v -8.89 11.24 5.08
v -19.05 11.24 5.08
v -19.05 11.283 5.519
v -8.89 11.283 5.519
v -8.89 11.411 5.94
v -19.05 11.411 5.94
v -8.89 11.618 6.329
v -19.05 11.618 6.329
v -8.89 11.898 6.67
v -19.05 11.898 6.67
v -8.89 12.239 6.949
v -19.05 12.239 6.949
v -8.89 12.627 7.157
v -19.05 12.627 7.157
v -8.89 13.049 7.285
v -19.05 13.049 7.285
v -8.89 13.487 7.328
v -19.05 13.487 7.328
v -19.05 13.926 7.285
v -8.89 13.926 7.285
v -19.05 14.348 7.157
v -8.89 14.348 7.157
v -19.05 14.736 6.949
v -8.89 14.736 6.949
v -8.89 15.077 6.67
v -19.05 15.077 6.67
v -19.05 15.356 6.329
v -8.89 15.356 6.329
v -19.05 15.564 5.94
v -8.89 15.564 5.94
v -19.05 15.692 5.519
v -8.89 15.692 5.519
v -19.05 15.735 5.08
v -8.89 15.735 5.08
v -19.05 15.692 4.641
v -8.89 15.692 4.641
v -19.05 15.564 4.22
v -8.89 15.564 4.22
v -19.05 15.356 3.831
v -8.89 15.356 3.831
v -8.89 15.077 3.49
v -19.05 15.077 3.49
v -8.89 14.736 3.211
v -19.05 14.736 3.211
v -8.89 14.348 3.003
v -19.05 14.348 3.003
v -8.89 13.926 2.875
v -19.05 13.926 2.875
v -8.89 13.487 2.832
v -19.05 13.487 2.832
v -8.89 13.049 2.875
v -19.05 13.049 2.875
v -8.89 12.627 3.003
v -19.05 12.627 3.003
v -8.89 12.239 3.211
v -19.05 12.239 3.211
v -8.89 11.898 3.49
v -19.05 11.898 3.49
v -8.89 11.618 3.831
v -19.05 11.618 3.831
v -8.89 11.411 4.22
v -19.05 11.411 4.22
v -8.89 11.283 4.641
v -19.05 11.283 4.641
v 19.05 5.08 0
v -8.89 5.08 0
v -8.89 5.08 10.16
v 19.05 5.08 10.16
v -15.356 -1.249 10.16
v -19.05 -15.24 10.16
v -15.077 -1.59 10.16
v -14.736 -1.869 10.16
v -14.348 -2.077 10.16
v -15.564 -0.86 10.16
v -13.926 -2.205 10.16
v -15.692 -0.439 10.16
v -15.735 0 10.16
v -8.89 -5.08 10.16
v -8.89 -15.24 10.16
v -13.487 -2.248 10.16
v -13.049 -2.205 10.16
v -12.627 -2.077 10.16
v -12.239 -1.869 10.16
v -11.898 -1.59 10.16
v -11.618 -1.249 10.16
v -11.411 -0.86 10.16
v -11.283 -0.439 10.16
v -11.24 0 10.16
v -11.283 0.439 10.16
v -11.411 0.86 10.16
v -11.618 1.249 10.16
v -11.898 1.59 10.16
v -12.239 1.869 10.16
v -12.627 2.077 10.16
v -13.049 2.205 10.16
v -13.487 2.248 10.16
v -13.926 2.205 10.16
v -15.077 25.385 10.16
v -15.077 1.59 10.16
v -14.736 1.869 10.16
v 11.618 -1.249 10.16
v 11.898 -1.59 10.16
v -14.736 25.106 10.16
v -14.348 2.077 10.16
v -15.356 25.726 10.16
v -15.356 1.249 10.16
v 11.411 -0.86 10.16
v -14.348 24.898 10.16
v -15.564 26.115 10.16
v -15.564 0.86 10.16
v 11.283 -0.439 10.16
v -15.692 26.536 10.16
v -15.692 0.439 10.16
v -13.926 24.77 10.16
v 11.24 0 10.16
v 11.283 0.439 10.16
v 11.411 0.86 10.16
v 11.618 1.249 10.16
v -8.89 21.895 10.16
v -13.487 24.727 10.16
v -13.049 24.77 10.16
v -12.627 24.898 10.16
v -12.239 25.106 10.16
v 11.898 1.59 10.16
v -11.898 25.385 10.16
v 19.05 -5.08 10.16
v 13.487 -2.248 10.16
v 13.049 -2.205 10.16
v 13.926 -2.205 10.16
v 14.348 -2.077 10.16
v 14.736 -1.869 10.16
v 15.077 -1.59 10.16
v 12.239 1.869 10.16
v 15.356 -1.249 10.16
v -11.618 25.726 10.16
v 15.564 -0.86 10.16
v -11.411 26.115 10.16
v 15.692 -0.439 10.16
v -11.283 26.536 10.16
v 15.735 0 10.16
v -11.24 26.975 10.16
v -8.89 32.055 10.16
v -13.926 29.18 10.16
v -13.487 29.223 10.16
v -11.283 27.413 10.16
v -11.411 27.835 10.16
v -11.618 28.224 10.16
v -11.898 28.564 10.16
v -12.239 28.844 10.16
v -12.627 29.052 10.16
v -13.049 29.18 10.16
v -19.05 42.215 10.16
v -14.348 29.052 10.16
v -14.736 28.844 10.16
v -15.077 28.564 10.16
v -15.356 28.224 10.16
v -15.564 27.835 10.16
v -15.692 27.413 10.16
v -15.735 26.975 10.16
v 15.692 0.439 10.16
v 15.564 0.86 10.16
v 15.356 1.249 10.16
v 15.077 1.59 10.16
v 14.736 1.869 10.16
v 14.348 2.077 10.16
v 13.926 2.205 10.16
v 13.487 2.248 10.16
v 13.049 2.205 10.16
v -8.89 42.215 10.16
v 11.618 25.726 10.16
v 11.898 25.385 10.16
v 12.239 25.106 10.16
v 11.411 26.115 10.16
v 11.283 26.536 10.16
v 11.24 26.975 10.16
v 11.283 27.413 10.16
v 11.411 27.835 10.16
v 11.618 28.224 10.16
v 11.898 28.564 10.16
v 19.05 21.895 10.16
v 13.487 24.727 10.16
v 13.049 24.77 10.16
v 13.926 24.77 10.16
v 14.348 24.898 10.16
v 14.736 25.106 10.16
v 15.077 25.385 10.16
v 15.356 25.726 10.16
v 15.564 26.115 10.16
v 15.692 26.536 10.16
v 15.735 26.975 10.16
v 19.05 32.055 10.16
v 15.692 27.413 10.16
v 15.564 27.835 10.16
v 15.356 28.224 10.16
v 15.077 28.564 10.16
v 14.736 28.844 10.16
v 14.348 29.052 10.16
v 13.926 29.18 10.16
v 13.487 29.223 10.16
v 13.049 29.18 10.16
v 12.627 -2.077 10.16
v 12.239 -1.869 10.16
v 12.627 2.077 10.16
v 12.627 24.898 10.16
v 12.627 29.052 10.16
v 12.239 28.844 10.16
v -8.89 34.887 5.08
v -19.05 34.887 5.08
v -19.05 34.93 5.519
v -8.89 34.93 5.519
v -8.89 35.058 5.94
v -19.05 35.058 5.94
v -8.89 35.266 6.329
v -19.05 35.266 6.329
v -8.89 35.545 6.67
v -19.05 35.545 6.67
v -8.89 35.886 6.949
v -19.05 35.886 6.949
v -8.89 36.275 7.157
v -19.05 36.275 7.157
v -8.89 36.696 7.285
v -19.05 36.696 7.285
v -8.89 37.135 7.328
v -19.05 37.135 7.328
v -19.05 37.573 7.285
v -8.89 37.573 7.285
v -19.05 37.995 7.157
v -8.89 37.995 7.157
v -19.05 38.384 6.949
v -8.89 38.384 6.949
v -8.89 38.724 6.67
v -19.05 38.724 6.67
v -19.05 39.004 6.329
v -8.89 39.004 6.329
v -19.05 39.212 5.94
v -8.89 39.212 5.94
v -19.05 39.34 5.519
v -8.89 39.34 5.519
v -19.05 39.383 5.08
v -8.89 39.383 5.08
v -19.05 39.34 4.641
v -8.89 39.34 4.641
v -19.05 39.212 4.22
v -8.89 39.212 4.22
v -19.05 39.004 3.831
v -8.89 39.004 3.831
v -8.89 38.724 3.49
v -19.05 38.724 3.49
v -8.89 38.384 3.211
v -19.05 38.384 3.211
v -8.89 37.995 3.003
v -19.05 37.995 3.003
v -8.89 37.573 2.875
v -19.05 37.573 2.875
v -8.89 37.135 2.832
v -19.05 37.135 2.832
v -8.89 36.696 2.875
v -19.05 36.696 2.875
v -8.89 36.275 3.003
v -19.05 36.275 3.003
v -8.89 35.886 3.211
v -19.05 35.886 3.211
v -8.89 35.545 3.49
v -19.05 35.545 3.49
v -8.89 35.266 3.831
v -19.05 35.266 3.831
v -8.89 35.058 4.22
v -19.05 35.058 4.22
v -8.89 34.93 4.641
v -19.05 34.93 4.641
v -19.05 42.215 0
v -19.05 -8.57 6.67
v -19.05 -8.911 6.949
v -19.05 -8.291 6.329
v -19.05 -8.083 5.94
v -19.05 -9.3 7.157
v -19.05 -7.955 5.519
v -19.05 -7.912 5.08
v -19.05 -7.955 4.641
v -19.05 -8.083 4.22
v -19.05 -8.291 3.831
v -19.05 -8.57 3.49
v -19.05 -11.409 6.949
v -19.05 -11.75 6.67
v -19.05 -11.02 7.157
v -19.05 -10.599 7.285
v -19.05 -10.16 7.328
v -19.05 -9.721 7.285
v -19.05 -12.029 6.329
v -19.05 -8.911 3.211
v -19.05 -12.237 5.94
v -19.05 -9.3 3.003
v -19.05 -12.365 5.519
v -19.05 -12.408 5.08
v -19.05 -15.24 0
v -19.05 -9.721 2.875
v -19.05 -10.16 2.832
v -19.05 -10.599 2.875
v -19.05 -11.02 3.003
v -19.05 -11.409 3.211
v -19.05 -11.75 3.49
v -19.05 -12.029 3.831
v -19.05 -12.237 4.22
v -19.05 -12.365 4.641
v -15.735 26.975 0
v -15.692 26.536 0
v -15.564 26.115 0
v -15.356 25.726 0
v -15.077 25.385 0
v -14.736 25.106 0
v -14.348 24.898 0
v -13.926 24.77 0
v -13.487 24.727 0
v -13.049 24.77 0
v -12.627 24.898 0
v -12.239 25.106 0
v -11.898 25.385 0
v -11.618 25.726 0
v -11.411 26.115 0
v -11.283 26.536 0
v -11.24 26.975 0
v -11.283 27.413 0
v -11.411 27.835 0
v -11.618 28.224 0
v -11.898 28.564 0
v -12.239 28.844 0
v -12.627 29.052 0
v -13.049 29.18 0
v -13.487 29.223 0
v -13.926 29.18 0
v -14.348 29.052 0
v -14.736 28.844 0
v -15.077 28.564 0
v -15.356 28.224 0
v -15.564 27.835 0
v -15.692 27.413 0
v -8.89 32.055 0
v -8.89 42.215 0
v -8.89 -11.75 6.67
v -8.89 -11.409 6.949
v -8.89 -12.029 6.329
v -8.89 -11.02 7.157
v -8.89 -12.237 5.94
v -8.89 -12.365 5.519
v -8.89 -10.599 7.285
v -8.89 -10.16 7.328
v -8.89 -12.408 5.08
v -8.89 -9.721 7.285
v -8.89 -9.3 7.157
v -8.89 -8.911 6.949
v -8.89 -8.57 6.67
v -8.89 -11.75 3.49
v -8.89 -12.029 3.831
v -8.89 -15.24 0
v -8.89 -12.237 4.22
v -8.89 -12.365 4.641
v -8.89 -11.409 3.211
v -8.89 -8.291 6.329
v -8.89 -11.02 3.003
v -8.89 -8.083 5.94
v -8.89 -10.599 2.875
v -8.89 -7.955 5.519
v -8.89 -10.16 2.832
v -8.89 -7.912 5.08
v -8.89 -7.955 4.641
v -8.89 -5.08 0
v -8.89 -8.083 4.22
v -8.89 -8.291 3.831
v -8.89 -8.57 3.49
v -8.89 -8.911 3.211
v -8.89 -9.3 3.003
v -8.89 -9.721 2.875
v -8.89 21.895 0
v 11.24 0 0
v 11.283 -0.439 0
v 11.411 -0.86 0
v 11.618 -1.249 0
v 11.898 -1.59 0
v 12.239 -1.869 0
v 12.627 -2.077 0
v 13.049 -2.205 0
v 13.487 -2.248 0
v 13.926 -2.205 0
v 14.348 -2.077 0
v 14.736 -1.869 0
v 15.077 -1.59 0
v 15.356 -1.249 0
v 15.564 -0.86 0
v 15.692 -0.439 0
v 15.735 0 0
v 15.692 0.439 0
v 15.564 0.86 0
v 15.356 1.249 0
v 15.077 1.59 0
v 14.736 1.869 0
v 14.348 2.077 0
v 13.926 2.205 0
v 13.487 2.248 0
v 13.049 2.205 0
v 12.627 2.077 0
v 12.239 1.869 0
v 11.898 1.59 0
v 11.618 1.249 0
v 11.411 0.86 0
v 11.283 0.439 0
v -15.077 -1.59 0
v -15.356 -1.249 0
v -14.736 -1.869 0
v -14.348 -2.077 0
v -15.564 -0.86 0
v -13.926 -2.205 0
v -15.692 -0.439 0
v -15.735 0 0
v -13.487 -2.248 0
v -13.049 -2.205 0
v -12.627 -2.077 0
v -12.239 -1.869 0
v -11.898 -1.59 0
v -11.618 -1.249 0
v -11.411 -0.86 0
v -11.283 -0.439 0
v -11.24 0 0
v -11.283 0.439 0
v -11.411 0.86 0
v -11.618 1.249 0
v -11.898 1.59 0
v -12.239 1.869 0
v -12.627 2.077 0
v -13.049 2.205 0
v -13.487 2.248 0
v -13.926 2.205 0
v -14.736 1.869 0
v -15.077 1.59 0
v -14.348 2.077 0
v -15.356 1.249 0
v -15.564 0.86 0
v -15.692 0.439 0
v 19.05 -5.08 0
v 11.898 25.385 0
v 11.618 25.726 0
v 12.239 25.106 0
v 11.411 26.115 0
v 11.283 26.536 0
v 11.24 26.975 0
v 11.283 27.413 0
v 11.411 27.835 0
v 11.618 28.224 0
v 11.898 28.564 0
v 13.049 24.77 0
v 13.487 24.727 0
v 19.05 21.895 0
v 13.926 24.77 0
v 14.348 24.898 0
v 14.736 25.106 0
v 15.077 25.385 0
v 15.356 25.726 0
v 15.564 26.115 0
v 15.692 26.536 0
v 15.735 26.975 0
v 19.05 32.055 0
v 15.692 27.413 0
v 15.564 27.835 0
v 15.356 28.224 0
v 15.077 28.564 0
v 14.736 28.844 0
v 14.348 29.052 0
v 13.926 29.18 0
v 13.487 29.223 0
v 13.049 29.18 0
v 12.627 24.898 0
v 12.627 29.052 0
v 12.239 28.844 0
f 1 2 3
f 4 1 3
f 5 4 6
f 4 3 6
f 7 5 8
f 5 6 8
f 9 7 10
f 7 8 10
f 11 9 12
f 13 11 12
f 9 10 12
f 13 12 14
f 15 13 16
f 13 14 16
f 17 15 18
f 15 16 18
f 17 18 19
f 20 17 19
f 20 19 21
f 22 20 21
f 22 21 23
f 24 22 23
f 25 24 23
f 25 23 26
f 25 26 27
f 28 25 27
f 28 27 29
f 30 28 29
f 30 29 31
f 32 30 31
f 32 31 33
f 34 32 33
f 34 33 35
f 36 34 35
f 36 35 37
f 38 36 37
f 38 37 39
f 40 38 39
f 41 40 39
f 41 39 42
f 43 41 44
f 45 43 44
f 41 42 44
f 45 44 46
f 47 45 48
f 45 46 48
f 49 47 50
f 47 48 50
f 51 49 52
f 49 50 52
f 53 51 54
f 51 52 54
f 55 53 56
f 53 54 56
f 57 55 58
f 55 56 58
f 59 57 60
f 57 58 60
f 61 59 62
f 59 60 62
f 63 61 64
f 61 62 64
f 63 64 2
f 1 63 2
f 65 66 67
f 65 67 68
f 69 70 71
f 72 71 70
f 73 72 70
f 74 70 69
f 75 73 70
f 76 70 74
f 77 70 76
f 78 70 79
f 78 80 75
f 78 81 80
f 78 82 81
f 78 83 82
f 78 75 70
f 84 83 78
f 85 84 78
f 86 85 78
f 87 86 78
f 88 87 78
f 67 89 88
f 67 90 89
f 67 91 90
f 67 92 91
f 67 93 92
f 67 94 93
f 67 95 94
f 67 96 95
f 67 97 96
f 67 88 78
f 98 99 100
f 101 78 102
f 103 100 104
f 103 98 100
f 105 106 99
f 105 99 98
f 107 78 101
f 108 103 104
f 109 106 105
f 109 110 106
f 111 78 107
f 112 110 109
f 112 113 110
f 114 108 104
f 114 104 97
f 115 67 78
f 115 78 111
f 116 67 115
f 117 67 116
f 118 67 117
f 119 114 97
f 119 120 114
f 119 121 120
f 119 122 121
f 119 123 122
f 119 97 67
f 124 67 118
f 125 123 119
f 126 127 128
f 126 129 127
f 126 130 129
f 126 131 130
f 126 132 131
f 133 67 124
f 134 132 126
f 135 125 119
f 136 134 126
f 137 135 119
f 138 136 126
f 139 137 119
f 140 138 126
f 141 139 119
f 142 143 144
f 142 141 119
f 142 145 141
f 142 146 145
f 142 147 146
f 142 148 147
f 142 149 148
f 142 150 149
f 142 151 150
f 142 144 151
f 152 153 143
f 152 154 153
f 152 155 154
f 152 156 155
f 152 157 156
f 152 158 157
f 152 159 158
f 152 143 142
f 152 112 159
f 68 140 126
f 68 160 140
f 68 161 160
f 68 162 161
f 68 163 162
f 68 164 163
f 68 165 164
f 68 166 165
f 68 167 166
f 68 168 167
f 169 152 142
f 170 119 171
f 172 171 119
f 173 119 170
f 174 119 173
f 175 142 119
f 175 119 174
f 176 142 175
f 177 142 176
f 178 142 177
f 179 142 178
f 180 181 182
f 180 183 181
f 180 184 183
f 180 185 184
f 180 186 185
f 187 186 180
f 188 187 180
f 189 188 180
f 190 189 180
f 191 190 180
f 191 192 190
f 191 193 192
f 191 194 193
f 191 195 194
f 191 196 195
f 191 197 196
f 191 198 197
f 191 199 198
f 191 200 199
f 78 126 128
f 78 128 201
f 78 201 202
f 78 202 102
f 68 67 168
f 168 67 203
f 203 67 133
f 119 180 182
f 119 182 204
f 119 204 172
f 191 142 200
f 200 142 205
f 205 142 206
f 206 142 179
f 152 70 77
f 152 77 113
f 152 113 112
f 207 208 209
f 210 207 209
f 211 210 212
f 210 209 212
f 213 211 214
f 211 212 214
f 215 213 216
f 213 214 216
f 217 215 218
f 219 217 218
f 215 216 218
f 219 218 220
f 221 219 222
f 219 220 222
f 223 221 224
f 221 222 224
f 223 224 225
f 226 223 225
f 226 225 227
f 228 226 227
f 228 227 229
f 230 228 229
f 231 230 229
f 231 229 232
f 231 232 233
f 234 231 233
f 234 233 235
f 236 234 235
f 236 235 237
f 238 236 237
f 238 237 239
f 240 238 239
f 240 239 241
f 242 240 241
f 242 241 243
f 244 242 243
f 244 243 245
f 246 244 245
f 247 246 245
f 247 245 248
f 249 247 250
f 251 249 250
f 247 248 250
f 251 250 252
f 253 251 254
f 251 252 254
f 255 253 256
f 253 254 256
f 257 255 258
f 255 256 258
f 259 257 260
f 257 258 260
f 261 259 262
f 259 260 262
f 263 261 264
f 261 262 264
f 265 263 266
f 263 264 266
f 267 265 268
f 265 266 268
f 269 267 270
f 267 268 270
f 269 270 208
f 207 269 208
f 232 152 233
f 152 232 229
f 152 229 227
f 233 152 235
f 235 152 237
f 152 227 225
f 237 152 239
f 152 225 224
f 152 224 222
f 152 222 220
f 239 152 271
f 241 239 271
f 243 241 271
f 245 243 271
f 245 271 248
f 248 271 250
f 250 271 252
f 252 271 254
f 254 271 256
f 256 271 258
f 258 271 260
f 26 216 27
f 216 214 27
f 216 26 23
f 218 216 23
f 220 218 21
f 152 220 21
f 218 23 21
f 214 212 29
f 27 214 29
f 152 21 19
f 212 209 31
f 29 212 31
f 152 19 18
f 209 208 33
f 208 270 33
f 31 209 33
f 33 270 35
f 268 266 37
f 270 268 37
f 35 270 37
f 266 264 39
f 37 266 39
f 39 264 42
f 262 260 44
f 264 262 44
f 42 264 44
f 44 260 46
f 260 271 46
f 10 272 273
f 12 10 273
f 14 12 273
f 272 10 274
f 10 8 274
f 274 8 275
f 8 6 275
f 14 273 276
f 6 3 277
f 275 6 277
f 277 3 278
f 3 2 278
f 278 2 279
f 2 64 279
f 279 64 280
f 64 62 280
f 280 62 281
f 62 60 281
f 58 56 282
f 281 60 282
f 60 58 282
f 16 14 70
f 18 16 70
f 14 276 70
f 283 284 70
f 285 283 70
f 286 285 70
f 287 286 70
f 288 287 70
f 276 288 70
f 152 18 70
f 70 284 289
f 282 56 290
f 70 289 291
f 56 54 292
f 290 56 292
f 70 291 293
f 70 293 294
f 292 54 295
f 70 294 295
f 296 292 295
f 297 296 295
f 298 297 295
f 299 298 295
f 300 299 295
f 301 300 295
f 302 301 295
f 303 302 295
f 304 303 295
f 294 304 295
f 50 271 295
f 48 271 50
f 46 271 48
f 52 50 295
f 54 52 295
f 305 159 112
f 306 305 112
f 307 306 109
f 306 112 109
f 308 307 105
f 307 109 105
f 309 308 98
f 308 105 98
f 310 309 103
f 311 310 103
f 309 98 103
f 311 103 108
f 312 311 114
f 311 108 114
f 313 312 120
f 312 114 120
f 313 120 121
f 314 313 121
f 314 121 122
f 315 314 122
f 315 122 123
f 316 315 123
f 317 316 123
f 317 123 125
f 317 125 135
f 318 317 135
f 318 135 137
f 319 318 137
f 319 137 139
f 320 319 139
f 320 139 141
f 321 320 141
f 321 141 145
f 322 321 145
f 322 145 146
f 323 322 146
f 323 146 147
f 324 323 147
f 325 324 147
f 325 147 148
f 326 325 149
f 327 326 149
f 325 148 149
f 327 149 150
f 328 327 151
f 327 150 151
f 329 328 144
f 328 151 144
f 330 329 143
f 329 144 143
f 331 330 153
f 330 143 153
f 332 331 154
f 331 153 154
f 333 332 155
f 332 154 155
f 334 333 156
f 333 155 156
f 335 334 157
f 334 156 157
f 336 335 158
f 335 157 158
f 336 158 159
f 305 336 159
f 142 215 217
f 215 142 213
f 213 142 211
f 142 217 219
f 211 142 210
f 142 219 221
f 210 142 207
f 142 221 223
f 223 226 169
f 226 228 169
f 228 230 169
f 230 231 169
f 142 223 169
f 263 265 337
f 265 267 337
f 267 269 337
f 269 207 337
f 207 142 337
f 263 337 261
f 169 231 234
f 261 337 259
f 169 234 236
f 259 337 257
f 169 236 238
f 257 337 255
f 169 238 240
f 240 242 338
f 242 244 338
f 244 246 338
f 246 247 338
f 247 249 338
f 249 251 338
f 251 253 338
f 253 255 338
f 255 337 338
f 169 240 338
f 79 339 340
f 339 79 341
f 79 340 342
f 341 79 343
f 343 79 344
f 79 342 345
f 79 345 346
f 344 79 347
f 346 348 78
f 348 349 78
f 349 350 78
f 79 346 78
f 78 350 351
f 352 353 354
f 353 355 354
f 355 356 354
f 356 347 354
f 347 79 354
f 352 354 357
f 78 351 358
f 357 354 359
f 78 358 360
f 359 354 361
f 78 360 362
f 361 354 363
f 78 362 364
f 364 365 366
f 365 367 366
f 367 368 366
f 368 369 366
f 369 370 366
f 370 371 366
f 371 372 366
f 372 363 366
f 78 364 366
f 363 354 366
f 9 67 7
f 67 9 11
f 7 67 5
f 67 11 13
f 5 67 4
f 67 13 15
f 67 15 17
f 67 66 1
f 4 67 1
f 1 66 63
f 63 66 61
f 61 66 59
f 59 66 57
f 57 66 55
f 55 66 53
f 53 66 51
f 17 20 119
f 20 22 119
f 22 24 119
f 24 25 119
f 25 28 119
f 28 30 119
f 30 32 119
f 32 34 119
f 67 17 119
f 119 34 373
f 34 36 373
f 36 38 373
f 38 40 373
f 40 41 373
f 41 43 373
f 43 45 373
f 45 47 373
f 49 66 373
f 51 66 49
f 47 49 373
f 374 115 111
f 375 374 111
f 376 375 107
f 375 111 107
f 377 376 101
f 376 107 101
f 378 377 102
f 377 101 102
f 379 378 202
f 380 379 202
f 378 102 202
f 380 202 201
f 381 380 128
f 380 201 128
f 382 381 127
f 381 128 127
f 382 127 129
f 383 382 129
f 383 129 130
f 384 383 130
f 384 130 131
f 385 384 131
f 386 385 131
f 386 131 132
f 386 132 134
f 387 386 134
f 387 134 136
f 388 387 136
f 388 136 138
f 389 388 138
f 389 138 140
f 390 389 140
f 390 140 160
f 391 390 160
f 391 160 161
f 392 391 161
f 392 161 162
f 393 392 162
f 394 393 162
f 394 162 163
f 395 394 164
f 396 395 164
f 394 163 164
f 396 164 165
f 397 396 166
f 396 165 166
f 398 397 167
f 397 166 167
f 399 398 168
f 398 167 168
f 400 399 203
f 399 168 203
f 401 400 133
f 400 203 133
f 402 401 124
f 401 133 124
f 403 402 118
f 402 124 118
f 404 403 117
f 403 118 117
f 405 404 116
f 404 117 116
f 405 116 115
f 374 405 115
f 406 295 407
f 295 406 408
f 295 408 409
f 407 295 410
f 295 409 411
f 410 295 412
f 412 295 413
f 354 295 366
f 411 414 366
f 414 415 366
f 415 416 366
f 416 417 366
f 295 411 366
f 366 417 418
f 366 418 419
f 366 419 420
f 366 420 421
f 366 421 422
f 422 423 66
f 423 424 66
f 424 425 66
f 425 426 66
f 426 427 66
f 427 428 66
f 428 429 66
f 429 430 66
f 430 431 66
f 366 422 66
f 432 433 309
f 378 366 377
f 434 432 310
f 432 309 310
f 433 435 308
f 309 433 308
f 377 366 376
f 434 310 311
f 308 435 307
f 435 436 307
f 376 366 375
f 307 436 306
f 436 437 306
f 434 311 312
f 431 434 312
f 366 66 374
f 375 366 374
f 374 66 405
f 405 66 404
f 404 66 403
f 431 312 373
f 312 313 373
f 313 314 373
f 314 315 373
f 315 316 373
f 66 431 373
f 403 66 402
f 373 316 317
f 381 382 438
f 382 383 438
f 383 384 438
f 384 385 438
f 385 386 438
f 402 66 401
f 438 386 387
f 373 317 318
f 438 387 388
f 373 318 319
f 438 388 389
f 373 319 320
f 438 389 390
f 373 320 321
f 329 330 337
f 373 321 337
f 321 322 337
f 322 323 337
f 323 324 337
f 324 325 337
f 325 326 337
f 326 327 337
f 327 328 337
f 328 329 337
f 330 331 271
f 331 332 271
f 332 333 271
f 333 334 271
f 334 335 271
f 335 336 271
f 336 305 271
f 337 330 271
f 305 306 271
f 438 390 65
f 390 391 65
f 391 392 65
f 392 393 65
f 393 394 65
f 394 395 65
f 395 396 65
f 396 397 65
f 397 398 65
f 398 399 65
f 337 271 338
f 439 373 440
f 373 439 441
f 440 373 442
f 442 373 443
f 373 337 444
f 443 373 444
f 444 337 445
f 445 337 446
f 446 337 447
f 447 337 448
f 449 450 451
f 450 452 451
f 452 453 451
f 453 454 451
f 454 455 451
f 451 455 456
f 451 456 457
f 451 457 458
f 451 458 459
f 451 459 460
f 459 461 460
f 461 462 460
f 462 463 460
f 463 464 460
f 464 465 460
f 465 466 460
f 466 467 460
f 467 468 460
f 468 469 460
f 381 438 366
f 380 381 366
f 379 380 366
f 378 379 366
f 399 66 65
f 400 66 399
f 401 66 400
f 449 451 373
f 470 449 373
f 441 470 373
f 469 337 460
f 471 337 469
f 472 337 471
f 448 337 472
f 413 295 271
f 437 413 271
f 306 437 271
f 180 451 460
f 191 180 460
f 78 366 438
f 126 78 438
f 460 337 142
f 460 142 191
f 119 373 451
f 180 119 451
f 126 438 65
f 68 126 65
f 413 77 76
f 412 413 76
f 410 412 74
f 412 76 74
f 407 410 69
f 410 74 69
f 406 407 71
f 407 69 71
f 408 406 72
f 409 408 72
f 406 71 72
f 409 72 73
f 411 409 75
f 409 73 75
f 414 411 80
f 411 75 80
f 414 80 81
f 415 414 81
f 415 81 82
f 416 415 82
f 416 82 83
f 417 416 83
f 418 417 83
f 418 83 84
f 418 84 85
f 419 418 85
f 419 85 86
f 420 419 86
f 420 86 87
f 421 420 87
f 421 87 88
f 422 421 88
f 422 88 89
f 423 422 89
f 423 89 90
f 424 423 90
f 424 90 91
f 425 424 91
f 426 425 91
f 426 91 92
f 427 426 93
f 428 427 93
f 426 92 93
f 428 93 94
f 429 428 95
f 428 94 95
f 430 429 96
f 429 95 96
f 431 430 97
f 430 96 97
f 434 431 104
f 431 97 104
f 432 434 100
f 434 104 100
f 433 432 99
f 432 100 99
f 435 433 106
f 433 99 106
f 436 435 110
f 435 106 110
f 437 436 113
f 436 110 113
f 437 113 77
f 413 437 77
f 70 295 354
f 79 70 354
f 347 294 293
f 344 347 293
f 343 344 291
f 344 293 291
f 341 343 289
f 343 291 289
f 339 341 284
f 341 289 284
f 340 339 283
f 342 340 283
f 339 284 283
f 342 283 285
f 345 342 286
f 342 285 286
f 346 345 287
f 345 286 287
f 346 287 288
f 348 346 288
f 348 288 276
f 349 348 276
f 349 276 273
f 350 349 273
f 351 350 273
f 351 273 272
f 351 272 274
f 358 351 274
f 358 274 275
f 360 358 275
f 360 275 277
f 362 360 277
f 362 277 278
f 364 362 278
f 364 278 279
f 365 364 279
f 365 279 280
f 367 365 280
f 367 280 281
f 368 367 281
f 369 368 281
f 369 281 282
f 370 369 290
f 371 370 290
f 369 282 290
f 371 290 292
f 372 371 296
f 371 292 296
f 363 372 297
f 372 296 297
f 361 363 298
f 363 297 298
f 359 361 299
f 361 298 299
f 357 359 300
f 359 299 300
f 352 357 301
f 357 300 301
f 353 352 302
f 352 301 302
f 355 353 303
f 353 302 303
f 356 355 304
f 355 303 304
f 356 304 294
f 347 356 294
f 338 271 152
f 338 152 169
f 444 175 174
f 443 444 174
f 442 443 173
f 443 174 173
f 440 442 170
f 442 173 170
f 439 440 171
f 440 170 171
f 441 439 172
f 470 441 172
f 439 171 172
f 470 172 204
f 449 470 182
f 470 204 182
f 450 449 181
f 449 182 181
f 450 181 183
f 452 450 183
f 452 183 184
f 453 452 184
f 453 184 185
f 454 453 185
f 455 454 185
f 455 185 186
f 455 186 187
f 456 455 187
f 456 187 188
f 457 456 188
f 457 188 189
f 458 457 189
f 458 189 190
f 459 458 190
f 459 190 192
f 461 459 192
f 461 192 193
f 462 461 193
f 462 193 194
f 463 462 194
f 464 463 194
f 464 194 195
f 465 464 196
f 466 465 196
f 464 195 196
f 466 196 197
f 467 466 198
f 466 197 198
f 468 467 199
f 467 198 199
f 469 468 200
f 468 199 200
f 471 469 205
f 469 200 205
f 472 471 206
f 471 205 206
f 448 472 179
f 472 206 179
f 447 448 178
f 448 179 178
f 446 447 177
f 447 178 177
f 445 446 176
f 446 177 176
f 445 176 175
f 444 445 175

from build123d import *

# Parameters (mm, degrees)
F0_W     = 10.16
F0_H     = 10.16
F0_W_2   = 27.94
F1_DEPTH = 10.16
F2_D     = 4.4958
F3_D     = 4.4958
F4_D     = 4.4958
F5_D     = 4.4958
F7_D     = 4.4958
F10_D    = 4.4958
F11_D    = 4.4958


# Not quite as in the source:
# - a feature names something its author has since deleted; it is built from what else it names


with BuildPart() as f1:
    # F0 (on Top) → F1 (new body)
    with BuildSketch(Plane.XY):
        Polygon((-19.05, 32.0548), (-19.05, -5.08), (-8.89, -5.08), (-8.89, 5.08), (-8.89, 21.8948), (-8.89, 32.0548), align=None)
        with Locations((-13.97, -10.16)):
            Rectangle(F0_W, F0_H)
        with Locations((5.08, 0)):
            Rectangle(F0_W_2, F0_H)
        with Locations((-13.97, 37.1348)):
            Rectangle(F0_W, F0_H)
        with Locations((5.08, 26.9748)):
            Rectangle(F0_W_2, F0_H)
    extrude(amount=F1_DEPTH)

    # F2 (through all)
    with Locations(Plane(origin=(0, 0, 0), x_dir=(1, 0, 0), z_dir=(0, 0, -1))):
        with Locations((13.4874, 0)):
            Hole(F2_D / 2)

    # F3 (through all)
    with Locations(Plane(origin=(0, 0, 0), x_dir=(1, 0, 0), z_dir=(0, 0, -1))):
        with Locations((-13.4874, 0)):
            Hole(F3_D / 2)

    # F4 (through all)
    with Locations(Plane(origin=(0, 0, 0), x_dir=(1, 0, 0), z_dir=(0, 0, -1))):
        with Locations((-13.4874, -26.9748)):
            Hole(F4_D / 2)

    # F5 (through all)
    with Locations(Plane(origin=(0, 0, 0), x_dir=(1, 0, 0), z_dir=(0, 0, -1))):
        with Locations((13.4874, -26.9748)):
            Hole(F5_D / 2)

    # F7 (through all)
    with Locations(Plane.YZ.offset(-8.89)):
        with Locations((13.4874, 5.08)):
            Hole(F7_D / 2)

    # F10 (through all)
    with Locations(Plane.YZ.offset(-8.89)):
        with Locations((-10.16, 5.08)):
            Hole(F10_D / 2)

    # F11 (through all)
    with Locations(Plane.YZ.offset(-8.89)):
        with Locations((37.1348, 5.08)):
            Hole(F11_D / 2)


solid = f1.part
